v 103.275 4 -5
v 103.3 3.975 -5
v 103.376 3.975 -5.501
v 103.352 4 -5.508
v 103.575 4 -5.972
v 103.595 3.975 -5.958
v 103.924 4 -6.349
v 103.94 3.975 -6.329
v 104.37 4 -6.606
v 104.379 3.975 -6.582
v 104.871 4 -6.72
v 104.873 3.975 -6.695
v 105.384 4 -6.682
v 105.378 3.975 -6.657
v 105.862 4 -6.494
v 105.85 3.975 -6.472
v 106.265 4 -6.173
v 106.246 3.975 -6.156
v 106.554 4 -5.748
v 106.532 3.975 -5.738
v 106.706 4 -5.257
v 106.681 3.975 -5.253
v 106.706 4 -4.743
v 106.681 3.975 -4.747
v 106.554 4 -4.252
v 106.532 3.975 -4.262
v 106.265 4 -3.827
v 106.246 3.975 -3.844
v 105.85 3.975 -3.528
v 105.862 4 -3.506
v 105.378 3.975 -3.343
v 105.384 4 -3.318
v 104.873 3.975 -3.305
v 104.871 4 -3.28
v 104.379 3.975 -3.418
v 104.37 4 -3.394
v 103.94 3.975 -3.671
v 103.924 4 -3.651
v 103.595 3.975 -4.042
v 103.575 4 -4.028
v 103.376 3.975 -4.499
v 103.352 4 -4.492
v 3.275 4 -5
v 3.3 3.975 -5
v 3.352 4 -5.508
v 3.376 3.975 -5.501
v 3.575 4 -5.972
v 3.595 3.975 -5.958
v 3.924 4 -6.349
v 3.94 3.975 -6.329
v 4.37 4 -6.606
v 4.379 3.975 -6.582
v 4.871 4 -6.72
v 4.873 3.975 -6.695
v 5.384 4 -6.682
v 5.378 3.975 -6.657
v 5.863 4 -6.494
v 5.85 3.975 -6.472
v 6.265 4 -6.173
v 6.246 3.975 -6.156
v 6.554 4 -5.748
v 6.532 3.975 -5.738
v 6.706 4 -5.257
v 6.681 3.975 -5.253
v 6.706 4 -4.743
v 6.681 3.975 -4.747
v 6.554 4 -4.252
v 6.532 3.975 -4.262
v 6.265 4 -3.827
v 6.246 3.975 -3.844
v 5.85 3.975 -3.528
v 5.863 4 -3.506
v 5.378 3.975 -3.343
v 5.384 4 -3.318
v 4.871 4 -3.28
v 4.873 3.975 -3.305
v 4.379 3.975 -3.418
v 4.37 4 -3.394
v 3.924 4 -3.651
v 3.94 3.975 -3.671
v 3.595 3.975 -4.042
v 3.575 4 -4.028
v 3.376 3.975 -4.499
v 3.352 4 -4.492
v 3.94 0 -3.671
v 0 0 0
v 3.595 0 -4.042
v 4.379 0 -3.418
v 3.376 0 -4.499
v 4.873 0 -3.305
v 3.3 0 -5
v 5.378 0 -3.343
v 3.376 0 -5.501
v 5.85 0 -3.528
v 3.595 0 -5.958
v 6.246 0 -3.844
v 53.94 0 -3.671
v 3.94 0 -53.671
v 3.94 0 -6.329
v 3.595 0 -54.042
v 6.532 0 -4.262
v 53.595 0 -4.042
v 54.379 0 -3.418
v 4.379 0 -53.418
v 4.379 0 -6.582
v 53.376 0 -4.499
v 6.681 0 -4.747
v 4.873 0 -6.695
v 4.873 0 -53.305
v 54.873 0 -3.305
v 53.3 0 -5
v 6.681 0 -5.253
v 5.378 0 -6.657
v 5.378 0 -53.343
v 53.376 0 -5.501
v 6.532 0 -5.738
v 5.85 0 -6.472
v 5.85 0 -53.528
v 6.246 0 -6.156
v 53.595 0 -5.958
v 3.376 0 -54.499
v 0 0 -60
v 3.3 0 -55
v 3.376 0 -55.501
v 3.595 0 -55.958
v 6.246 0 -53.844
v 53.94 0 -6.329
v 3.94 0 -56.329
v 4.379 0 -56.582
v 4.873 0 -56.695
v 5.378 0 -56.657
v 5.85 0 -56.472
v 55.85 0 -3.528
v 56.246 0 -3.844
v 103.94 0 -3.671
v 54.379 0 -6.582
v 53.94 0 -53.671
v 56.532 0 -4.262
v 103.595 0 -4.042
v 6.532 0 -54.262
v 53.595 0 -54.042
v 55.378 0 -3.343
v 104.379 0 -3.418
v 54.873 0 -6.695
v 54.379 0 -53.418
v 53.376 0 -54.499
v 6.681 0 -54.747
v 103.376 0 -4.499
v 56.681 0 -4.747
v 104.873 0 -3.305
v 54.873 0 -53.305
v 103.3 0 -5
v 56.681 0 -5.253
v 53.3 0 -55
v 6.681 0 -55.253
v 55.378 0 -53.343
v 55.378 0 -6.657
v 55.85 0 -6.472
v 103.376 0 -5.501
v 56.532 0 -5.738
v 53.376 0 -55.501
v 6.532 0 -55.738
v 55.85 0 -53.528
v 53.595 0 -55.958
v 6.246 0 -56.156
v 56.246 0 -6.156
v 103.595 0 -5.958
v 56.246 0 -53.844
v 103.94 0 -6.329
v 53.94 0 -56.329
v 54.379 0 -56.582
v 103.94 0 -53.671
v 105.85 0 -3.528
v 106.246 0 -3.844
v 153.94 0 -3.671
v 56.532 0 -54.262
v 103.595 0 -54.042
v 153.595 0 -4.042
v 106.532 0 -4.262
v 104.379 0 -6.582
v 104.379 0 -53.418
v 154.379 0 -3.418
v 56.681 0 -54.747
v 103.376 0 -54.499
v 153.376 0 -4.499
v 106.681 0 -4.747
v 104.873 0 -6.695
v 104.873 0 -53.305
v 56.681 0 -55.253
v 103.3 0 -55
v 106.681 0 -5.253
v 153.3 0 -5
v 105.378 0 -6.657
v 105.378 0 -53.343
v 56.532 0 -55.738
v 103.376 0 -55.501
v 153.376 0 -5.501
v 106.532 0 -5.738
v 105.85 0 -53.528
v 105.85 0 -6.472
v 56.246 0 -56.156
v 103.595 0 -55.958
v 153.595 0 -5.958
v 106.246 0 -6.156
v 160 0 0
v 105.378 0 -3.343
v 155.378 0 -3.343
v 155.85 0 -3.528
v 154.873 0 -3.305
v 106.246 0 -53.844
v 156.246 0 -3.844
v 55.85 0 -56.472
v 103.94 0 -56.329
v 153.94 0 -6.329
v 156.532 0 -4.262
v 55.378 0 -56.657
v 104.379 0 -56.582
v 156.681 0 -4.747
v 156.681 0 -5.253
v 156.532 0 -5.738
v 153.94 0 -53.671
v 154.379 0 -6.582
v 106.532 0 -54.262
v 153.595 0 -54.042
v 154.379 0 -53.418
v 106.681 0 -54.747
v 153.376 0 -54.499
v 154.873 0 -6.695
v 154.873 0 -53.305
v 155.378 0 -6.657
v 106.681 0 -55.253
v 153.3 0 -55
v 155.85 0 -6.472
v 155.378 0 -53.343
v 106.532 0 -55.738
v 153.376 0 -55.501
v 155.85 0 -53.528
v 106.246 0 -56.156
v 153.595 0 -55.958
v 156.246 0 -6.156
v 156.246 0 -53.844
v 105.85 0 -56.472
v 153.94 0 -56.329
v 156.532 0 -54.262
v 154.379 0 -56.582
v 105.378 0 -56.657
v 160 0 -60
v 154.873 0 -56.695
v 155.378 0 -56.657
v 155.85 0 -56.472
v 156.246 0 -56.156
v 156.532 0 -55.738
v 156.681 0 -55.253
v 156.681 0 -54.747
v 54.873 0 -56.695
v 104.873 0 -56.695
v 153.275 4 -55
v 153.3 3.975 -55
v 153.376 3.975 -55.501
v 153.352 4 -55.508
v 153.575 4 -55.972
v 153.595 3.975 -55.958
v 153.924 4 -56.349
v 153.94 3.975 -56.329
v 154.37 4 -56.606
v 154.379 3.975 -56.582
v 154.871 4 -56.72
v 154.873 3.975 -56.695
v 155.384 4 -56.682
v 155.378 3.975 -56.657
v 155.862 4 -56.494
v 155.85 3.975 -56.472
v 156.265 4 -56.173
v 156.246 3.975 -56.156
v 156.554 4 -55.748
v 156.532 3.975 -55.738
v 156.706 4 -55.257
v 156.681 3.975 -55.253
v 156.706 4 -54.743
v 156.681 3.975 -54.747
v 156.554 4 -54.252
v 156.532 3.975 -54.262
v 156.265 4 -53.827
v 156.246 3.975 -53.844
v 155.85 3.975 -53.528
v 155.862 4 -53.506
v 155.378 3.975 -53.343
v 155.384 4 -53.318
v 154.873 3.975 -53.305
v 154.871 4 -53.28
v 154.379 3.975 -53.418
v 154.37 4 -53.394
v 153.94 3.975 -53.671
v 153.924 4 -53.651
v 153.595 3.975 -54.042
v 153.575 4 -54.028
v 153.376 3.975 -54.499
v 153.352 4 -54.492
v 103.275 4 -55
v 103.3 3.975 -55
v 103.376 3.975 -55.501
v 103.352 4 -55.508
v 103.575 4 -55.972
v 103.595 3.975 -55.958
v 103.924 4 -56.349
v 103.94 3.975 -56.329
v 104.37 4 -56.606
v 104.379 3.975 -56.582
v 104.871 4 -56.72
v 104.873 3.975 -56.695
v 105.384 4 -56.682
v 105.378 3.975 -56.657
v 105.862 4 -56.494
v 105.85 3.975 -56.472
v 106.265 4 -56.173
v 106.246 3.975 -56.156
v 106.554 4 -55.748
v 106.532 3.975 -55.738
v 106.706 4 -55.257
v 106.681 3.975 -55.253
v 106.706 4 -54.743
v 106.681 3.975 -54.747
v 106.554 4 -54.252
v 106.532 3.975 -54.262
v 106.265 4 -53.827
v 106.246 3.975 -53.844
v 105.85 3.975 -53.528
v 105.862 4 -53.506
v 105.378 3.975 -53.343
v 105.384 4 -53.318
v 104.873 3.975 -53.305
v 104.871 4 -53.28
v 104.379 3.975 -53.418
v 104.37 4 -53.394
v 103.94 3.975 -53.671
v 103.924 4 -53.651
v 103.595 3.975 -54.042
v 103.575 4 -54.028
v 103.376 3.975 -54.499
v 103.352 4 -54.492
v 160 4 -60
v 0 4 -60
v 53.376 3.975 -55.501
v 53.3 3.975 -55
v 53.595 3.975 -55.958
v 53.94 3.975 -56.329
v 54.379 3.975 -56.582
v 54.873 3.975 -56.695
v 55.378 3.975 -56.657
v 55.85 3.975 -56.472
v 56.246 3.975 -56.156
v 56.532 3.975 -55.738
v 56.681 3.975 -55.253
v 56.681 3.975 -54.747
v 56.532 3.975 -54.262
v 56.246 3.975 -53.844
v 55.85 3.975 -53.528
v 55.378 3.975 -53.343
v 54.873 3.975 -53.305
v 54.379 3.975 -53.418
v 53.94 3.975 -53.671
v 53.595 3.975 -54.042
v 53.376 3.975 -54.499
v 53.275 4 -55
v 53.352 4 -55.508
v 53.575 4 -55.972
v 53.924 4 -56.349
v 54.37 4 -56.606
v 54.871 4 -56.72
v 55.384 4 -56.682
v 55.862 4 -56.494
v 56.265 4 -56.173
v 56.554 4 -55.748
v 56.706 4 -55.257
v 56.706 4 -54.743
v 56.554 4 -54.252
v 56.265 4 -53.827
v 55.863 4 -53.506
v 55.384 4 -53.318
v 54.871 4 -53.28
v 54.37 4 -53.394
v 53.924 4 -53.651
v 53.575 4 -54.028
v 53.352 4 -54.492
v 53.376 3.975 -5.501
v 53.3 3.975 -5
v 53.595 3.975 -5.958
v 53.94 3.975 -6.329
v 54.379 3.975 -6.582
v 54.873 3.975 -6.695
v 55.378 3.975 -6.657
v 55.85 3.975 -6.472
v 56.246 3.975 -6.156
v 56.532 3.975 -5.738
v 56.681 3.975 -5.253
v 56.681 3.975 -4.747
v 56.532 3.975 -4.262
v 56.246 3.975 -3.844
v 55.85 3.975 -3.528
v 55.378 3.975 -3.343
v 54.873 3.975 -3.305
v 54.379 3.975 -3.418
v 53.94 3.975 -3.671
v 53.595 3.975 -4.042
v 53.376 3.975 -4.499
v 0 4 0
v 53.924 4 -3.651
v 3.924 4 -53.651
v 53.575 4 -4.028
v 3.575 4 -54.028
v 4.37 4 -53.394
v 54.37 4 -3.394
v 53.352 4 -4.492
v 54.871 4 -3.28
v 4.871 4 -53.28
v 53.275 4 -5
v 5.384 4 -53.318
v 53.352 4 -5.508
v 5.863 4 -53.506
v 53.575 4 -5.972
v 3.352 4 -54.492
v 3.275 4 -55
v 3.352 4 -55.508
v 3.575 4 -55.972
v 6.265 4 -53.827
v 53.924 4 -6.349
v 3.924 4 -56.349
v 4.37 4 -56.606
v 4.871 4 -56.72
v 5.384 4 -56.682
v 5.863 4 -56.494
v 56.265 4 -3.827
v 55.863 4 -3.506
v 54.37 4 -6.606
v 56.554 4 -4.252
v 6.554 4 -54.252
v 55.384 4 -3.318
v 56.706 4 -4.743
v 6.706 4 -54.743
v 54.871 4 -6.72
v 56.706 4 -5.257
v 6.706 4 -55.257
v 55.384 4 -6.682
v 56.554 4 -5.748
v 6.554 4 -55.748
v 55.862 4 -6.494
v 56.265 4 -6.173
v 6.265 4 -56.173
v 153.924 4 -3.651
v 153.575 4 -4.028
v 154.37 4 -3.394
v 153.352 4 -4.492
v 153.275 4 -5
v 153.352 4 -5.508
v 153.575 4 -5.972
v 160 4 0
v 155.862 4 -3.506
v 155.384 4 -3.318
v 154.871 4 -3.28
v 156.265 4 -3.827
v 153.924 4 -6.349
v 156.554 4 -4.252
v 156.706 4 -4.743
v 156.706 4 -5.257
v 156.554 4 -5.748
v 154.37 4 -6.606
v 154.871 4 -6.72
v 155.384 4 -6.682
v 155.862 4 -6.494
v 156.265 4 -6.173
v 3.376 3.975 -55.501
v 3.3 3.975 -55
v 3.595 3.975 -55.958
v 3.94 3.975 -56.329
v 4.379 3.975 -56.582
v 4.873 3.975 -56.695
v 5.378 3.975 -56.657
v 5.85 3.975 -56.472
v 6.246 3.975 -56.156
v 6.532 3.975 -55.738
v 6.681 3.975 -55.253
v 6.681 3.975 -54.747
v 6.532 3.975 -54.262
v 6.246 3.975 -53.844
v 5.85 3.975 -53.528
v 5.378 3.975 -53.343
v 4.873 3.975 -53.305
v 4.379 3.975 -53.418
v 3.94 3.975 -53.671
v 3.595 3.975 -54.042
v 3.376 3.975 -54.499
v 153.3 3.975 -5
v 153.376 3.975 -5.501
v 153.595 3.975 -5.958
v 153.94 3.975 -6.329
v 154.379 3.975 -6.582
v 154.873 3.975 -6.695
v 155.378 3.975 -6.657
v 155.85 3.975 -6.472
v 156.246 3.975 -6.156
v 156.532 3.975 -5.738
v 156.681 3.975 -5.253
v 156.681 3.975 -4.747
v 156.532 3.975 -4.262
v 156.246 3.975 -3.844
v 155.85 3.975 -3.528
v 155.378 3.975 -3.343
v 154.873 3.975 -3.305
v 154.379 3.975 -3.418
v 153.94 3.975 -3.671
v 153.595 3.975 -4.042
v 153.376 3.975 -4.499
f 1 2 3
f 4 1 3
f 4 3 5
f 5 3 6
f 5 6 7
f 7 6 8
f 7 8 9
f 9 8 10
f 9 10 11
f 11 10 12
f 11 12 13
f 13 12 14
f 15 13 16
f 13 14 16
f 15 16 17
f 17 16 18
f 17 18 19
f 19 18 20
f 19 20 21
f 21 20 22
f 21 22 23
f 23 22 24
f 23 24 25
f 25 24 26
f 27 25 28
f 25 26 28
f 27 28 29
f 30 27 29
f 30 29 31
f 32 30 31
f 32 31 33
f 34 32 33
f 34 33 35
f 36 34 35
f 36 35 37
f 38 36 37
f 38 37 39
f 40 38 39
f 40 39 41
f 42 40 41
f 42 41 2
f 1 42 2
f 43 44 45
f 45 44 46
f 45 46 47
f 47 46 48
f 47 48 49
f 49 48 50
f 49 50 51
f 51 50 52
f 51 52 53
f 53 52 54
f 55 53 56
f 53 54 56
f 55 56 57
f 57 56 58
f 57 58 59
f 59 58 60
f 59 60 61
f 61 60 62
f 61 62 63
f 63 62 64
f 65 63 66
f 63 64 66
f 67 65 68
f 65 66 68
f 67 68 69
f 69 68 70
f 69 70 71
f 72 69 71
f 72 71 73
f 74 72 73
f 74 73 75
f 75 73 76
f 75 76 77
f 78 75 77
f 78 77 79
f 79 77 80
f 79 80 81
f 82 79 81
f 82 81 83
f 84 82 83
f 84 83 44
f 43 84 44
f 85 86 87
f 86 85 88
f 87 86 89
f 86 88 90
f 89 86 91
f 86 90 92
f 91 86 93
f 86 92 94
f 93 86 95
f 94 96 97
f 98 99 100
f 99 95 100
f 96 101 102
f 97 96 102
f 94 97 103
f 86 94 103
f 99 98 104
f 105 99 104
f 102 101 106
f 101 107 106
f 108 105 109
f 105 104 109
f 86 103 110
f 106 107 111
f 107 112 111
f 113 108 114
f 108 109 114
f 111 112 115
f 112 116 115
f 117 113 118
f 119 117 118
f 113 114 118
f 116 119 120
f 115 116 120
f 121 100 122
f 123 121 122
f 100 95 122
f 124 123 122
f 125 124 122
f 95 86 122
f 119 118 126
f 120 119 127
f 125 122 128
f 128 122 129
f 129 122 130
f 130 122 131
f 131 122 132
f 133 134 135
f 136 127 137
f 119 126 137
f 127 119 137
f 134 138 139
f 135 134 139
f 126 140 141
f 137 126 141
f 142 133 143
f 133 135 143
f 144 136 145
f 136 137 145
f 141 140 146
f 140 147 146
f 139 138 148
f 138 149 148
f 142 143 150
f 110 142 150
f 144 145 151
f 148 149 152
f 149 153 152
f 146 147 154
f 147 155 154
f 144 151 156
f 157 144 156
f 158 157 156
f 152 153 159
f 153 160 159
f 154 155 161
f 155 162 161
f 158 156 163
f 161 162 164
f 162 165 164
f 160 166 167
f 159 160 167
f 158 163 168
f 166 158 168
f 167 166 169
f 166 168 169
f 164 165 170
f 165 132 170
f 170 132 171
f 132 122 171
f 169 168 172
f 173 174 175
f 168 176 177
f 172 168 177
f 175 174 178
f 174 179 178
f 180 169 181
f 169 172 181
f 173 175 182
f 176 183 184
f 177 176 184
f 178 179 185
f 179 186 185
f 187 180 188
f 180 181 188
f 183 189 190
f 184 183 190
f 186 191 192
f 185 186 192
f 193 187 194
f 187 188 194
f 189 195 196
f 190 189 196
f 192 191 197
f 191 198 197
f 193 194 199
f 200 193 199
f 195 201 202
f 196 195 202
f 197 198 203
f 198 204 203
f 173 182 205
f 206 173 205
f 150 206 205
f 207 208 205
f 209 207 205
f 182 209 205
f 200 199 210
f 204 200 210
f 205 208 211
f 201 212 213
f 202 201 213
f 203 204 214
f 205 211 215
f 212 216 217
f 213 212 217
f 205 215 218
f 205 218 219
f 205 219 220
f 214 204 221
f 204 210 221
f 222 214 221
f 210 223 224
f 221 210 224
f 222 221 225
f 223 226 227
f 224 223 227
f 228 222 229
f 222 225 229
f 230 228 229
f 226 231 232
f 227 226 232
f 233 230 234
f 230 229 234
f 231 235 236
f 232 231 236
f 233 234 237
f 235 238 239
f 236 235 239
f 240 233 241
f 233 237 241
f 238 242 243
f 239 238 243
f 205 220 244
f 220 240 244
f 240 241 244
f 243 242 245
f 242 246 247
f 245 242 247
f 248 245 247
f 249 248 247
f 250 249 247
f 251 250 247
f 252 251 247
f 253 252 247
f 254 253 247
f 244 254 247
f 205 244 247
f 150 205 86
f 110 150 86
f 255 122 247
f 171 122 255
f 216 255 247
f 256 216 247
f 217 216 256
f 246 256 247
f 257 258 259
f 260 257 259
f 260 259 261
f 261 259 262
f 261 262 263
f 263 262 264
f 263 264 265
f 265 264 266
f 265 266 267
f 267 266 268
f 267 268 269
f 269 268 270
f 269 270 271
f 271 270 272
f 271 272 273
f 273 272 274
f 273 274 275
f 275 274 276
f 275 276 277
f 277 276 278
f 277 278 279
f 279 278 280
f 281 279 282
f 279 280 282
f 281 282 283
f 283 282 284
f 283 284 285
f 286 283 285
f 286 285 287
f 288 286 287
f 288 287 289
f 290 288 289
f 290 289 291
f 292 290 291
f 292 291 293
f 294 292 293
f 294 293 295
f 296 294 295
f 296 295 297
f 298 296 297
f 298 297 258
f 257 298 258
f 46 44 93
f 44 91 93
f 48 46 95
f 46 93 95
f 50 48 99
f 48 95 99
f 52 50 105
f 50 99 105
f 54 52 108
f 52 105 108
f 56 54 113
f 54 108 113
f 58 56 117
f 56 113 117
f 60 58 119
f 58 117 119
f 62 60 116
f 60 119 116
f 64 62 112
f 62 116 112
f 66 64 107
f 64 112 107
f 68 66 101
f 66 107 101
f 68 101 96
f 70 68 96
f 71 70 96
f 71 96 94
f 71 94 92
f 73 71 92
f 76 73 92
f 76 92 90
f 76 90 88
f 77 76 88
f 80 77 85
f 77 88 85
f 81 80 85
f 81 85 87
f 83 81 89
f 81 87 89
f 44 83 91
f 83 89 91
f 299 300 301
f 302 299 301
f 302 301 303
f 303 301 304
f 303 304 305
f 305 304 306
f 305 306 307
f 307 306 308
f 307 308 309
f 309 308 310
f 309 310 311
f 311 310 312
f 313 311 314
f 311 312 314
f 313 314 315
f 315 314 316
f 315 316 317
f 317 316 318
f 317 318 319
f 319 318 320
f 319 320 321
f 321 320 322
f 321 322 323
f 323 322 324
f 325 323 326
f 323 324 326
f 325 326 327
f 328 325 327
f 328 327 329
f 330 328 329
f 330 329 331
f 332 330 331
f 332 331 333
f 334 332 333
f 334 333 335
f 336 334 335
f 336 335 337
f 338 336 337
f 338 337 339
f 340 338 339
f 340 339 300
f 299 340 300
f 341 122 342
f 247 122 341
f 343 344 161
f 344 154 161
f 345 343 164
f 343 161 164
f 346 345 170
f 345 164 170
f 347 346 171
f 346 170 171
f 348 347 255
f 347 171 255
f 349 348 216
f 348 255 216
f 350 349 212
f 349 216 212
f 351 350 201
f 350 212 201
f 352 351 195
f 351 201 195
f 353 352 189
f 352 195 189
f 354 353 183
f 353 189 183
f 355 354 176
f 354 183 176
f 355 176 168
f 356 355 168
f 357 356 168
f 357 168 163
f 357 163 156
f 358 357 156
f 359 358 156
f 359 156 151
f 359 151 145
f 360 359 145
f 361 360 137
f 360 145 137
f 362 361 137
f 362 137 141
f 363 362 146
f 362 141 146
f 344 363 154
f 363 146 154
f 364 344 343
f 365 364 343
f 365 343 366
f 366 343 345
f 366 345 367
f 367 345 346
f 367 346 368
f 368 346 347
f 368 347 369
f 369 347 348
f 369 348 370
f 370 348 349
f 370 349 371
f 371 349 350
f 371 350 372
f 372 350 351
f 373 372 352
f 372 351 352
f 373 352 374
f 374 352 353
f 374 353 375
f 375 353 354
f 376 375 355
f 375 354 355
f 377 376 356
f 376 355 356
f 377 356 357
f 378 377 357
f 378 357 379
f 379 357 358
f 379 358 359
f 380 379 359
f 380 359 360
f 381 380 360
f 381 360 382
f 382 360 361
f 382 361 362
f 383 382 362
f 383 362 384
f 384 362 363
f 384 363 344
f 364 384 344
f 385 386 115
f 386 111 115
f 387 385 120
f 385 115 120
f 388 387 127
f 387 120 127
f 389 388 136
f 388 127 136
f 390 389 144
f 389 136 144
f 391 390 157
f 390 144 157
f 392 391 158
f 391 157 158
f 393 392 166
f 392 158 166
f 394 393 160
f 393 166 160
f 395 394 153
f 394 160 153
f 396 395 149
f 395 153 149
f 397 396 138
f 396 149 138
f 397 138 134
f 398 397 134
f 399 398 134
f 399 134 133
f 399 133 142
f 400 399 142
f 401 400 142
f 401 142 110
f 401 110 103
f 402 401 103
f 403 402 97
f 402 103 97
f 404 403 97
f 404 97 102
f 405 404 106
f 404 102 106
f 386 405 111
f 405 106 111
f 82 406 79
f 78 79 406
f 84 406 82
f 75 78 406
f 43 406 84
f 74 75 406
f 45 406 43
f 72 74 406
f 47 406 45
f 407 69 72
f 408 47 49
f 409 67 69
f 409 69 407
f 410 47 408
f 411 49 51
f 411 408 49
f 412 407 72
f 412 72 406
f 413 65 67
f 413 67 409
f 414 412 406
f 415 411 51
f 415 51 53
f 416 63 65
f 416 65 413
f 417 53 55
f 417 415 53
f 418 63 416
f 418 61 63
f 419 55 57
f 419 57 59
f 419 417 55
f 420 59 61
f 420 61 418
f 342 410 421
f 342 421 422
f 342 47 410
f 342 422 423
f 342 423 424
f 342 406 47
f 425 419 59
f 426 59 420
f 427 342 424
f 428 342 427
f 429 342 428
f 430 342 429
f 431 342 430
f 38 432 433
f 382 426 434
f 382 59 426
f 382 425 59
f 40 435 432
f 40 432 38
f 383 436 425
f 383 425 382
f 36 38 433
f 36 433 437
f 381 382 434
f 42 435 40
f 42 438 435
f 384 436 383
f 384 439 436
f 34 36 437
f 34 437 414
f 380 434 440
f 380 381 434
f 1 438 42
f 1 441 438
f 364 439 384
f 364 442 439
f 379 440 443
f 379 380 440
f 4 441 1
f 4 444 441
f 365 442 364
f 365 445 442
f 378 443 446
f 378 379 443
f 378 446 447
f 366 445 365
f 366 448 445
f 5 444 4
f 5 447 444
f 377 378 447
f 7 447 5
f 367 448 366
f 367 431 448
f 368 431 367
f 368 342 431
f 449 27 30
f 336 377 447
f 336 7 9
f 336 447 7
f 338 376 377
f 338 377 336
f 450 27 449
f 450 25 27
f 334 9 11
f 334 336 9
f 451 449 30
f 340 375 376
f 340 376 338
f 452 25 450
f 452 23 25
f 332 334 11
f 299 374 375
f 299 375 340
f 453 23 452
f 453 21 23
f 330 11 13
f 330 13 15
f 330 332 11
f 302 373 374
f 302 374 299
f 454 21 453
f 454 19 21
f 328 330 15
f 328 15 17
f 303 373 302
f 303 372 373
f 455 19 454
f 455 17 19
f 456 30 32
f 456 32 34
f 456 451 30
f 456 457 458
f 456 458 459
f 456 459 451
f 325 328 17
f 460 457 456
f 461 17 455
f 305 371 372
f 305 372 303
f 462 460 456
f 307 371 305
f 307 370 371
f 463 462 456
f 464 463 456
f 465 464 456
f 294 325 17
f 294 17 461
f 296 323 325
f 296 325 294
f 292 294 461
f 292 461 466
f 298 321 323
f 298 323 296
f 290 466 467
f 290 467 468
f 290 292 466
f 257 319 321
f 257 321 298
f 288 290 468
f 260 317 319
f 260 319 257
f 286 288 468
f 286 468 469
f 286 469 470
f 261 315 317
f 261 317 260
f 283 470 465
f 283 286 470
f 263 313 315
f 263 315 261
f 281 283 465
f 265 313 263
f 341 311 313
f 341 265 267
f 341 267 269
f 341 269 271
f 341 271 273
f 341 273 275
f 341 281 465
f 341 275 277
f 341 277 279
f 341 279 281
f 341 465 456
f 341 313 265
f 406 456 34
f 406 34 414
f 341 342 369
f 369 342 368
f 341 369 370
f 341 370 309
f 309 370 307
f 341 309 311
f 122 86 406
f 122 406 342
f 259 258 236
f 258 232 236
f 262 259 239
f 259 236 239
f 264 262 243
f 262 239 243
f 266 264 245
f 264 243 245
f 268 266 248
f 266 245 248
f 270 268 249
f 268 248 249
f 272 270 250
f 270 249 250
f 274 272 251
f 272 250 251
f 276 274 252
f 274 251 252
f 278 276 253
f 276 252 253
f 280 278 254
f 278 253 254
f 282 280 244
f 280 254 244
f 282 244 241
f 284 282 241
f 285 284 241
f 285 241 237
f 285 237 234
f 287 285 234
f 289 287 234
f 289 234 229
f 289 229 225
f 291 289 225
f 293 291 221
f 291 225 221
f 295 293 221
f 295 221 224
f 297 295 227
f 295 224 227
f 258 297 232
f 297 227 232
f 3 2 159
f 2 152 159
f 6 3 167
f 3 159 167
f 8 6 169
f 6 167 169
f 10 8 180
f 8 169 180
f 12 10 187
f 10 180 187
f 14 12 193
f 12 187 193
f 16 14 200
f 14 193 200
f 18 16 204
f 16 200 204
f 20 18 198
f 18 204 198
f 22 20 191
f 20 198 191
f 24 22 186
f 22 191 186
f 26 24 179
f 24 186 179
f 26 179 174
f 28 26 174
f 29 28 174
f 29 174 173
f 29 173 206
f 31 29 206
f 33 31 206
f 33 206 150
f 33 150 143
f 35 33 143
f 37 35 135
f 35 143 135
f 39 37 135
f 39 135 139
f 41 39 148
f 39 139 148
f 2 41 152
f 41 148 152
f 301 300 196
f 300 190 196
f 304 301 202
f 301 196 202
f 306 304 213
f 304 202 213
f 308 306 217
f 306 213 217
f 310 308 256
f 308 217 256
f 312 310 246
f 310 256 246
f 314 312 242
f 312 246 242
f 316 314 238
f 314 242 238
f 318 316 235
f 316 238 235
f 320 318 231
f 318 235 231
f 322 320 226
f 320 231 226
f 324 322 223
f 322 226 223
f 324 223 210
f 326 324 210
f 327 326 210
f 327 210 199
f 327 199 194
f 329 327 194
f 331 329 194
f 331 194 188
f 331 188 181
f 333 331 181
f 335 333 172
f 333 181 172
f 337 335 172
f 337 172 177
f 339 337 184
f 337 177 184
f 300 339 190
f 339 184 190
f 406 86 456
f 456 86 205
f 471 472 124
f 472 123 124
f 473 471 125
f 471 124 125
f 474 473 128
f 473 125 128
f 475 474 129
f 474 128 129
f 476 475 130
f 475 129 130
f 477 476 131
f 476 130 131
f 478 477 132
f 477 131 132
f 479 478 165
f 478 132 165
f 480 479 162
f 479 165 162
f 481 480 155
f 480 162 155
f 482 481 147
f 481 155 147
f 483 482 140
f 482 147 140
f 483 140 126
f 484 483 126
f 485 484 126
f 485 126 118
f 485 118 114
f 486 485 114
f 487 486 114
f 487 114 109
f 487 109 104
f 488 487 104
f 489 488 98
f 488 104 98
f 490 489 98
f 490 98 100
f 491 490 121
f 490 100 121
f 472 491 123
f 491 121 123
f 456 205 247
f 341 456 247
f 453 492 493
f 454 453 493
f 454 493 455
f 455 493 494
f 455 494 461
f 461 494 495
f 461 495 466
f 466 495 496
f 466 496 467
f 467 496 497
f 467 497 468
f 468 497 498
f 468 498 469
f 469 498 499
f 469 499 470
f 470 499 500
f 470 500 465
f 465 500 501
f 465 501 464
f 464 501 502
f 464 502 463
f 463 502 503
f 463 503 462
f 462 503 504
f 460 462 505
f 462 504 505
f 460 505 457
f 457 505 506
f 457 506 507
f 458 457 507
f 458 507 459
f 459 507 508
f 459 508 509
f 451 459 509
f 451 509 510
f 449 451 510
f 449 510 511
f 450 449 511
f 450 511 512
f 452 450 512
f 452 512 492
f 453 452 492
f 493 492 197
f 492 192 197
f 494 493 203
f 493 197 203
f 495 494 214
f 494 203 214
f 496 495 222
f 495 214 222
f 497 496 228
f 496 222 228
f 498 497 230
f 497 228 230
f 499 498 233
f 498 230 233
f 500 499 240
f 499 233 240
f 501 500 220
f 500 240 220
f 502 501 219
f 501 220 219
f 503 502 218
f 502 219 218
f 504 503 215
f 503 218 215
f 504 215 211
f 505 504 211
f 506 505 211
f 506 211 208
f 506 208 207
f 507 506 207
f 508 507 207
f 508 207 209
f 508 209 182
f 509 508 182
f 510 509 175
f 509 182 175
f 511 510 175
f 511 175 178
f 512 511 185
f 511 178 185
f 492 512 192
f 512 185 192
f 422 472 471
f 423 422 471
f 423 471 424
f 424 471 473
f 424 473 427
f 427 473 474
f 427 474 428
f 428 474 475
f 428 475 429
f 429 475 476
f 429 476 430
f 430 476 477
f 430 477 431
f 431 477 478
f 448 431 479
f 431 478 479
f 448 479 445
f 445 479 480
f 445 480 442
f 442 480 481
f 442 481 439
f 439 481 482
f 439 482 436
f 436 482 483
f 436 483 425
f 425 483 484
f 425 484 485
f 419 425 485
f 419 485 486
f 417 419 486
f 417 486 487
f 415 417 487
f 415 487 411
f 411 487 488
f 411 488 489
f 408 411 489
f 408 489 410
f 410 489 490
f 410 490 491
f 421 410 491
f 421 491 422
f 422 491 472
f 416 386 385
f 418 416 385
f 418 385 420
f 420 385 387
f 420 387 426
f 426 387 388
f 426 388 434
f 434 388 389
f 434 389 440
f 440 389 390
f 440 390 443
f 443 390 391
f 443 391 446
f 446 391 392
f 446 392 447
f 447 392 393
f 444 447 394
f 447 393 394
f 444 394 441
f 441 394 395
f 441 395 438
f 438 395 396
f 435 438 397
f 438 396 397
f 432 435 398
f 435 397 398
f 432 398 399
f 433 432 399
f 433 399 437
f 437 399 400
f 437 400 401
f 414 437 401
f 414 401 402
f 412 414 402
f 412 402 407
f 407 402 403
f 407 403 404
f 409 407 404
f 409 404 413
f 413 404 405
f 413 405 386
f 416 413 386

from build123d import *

# Parameters (mm, degrees)
SKETCH1_W                      = 160
SKETCH1_H                      = 60
BOSS_EXTRUDE1_DEPTH            = 4
M3_CLEARANCE_HOLE1_D           = 3.4
M3_CLEARANCE_HOLE1_CSINK_D     = 3.45
M3_CLEARANCE_HOLE1_CSINK_ANGLE = 90


with BuildPart() as part:
    # Sketch1 → Boss-Extrude1 (new body)
    with BuildSketch(Plane(origin=(0, 0, 0), x_dir=(1, 0, 0), z_dir=(0, 1, 0))):
        with Locations((80, 30)):
            Rectangle(SKETCH1_W, SKETCH1_H)
    extrude(amount=BOSS_EXTRUDE1_DEPTH)

    # M3 Clearance Hole1 (through all)
    with Locations(Plane(origin=(0, 4, 0), x_dir=(1, 0, 0), z_dir=(0, 1, 0))):
        with Locations((155, 55), (5, 5), (55, 5), (105, 5), (155, 5), (5, 55), (55, 55), (105, 55)):
            CounterSinkHole(M3_CLEARANCE_HOLE1_D / 2, M3_CLEARANCE_HOLE1_CSINK_D / 2, counter_sink_angle=M3_CLEARANCE_HOLE1_CSINK_ANGLE)


solid = part.part
